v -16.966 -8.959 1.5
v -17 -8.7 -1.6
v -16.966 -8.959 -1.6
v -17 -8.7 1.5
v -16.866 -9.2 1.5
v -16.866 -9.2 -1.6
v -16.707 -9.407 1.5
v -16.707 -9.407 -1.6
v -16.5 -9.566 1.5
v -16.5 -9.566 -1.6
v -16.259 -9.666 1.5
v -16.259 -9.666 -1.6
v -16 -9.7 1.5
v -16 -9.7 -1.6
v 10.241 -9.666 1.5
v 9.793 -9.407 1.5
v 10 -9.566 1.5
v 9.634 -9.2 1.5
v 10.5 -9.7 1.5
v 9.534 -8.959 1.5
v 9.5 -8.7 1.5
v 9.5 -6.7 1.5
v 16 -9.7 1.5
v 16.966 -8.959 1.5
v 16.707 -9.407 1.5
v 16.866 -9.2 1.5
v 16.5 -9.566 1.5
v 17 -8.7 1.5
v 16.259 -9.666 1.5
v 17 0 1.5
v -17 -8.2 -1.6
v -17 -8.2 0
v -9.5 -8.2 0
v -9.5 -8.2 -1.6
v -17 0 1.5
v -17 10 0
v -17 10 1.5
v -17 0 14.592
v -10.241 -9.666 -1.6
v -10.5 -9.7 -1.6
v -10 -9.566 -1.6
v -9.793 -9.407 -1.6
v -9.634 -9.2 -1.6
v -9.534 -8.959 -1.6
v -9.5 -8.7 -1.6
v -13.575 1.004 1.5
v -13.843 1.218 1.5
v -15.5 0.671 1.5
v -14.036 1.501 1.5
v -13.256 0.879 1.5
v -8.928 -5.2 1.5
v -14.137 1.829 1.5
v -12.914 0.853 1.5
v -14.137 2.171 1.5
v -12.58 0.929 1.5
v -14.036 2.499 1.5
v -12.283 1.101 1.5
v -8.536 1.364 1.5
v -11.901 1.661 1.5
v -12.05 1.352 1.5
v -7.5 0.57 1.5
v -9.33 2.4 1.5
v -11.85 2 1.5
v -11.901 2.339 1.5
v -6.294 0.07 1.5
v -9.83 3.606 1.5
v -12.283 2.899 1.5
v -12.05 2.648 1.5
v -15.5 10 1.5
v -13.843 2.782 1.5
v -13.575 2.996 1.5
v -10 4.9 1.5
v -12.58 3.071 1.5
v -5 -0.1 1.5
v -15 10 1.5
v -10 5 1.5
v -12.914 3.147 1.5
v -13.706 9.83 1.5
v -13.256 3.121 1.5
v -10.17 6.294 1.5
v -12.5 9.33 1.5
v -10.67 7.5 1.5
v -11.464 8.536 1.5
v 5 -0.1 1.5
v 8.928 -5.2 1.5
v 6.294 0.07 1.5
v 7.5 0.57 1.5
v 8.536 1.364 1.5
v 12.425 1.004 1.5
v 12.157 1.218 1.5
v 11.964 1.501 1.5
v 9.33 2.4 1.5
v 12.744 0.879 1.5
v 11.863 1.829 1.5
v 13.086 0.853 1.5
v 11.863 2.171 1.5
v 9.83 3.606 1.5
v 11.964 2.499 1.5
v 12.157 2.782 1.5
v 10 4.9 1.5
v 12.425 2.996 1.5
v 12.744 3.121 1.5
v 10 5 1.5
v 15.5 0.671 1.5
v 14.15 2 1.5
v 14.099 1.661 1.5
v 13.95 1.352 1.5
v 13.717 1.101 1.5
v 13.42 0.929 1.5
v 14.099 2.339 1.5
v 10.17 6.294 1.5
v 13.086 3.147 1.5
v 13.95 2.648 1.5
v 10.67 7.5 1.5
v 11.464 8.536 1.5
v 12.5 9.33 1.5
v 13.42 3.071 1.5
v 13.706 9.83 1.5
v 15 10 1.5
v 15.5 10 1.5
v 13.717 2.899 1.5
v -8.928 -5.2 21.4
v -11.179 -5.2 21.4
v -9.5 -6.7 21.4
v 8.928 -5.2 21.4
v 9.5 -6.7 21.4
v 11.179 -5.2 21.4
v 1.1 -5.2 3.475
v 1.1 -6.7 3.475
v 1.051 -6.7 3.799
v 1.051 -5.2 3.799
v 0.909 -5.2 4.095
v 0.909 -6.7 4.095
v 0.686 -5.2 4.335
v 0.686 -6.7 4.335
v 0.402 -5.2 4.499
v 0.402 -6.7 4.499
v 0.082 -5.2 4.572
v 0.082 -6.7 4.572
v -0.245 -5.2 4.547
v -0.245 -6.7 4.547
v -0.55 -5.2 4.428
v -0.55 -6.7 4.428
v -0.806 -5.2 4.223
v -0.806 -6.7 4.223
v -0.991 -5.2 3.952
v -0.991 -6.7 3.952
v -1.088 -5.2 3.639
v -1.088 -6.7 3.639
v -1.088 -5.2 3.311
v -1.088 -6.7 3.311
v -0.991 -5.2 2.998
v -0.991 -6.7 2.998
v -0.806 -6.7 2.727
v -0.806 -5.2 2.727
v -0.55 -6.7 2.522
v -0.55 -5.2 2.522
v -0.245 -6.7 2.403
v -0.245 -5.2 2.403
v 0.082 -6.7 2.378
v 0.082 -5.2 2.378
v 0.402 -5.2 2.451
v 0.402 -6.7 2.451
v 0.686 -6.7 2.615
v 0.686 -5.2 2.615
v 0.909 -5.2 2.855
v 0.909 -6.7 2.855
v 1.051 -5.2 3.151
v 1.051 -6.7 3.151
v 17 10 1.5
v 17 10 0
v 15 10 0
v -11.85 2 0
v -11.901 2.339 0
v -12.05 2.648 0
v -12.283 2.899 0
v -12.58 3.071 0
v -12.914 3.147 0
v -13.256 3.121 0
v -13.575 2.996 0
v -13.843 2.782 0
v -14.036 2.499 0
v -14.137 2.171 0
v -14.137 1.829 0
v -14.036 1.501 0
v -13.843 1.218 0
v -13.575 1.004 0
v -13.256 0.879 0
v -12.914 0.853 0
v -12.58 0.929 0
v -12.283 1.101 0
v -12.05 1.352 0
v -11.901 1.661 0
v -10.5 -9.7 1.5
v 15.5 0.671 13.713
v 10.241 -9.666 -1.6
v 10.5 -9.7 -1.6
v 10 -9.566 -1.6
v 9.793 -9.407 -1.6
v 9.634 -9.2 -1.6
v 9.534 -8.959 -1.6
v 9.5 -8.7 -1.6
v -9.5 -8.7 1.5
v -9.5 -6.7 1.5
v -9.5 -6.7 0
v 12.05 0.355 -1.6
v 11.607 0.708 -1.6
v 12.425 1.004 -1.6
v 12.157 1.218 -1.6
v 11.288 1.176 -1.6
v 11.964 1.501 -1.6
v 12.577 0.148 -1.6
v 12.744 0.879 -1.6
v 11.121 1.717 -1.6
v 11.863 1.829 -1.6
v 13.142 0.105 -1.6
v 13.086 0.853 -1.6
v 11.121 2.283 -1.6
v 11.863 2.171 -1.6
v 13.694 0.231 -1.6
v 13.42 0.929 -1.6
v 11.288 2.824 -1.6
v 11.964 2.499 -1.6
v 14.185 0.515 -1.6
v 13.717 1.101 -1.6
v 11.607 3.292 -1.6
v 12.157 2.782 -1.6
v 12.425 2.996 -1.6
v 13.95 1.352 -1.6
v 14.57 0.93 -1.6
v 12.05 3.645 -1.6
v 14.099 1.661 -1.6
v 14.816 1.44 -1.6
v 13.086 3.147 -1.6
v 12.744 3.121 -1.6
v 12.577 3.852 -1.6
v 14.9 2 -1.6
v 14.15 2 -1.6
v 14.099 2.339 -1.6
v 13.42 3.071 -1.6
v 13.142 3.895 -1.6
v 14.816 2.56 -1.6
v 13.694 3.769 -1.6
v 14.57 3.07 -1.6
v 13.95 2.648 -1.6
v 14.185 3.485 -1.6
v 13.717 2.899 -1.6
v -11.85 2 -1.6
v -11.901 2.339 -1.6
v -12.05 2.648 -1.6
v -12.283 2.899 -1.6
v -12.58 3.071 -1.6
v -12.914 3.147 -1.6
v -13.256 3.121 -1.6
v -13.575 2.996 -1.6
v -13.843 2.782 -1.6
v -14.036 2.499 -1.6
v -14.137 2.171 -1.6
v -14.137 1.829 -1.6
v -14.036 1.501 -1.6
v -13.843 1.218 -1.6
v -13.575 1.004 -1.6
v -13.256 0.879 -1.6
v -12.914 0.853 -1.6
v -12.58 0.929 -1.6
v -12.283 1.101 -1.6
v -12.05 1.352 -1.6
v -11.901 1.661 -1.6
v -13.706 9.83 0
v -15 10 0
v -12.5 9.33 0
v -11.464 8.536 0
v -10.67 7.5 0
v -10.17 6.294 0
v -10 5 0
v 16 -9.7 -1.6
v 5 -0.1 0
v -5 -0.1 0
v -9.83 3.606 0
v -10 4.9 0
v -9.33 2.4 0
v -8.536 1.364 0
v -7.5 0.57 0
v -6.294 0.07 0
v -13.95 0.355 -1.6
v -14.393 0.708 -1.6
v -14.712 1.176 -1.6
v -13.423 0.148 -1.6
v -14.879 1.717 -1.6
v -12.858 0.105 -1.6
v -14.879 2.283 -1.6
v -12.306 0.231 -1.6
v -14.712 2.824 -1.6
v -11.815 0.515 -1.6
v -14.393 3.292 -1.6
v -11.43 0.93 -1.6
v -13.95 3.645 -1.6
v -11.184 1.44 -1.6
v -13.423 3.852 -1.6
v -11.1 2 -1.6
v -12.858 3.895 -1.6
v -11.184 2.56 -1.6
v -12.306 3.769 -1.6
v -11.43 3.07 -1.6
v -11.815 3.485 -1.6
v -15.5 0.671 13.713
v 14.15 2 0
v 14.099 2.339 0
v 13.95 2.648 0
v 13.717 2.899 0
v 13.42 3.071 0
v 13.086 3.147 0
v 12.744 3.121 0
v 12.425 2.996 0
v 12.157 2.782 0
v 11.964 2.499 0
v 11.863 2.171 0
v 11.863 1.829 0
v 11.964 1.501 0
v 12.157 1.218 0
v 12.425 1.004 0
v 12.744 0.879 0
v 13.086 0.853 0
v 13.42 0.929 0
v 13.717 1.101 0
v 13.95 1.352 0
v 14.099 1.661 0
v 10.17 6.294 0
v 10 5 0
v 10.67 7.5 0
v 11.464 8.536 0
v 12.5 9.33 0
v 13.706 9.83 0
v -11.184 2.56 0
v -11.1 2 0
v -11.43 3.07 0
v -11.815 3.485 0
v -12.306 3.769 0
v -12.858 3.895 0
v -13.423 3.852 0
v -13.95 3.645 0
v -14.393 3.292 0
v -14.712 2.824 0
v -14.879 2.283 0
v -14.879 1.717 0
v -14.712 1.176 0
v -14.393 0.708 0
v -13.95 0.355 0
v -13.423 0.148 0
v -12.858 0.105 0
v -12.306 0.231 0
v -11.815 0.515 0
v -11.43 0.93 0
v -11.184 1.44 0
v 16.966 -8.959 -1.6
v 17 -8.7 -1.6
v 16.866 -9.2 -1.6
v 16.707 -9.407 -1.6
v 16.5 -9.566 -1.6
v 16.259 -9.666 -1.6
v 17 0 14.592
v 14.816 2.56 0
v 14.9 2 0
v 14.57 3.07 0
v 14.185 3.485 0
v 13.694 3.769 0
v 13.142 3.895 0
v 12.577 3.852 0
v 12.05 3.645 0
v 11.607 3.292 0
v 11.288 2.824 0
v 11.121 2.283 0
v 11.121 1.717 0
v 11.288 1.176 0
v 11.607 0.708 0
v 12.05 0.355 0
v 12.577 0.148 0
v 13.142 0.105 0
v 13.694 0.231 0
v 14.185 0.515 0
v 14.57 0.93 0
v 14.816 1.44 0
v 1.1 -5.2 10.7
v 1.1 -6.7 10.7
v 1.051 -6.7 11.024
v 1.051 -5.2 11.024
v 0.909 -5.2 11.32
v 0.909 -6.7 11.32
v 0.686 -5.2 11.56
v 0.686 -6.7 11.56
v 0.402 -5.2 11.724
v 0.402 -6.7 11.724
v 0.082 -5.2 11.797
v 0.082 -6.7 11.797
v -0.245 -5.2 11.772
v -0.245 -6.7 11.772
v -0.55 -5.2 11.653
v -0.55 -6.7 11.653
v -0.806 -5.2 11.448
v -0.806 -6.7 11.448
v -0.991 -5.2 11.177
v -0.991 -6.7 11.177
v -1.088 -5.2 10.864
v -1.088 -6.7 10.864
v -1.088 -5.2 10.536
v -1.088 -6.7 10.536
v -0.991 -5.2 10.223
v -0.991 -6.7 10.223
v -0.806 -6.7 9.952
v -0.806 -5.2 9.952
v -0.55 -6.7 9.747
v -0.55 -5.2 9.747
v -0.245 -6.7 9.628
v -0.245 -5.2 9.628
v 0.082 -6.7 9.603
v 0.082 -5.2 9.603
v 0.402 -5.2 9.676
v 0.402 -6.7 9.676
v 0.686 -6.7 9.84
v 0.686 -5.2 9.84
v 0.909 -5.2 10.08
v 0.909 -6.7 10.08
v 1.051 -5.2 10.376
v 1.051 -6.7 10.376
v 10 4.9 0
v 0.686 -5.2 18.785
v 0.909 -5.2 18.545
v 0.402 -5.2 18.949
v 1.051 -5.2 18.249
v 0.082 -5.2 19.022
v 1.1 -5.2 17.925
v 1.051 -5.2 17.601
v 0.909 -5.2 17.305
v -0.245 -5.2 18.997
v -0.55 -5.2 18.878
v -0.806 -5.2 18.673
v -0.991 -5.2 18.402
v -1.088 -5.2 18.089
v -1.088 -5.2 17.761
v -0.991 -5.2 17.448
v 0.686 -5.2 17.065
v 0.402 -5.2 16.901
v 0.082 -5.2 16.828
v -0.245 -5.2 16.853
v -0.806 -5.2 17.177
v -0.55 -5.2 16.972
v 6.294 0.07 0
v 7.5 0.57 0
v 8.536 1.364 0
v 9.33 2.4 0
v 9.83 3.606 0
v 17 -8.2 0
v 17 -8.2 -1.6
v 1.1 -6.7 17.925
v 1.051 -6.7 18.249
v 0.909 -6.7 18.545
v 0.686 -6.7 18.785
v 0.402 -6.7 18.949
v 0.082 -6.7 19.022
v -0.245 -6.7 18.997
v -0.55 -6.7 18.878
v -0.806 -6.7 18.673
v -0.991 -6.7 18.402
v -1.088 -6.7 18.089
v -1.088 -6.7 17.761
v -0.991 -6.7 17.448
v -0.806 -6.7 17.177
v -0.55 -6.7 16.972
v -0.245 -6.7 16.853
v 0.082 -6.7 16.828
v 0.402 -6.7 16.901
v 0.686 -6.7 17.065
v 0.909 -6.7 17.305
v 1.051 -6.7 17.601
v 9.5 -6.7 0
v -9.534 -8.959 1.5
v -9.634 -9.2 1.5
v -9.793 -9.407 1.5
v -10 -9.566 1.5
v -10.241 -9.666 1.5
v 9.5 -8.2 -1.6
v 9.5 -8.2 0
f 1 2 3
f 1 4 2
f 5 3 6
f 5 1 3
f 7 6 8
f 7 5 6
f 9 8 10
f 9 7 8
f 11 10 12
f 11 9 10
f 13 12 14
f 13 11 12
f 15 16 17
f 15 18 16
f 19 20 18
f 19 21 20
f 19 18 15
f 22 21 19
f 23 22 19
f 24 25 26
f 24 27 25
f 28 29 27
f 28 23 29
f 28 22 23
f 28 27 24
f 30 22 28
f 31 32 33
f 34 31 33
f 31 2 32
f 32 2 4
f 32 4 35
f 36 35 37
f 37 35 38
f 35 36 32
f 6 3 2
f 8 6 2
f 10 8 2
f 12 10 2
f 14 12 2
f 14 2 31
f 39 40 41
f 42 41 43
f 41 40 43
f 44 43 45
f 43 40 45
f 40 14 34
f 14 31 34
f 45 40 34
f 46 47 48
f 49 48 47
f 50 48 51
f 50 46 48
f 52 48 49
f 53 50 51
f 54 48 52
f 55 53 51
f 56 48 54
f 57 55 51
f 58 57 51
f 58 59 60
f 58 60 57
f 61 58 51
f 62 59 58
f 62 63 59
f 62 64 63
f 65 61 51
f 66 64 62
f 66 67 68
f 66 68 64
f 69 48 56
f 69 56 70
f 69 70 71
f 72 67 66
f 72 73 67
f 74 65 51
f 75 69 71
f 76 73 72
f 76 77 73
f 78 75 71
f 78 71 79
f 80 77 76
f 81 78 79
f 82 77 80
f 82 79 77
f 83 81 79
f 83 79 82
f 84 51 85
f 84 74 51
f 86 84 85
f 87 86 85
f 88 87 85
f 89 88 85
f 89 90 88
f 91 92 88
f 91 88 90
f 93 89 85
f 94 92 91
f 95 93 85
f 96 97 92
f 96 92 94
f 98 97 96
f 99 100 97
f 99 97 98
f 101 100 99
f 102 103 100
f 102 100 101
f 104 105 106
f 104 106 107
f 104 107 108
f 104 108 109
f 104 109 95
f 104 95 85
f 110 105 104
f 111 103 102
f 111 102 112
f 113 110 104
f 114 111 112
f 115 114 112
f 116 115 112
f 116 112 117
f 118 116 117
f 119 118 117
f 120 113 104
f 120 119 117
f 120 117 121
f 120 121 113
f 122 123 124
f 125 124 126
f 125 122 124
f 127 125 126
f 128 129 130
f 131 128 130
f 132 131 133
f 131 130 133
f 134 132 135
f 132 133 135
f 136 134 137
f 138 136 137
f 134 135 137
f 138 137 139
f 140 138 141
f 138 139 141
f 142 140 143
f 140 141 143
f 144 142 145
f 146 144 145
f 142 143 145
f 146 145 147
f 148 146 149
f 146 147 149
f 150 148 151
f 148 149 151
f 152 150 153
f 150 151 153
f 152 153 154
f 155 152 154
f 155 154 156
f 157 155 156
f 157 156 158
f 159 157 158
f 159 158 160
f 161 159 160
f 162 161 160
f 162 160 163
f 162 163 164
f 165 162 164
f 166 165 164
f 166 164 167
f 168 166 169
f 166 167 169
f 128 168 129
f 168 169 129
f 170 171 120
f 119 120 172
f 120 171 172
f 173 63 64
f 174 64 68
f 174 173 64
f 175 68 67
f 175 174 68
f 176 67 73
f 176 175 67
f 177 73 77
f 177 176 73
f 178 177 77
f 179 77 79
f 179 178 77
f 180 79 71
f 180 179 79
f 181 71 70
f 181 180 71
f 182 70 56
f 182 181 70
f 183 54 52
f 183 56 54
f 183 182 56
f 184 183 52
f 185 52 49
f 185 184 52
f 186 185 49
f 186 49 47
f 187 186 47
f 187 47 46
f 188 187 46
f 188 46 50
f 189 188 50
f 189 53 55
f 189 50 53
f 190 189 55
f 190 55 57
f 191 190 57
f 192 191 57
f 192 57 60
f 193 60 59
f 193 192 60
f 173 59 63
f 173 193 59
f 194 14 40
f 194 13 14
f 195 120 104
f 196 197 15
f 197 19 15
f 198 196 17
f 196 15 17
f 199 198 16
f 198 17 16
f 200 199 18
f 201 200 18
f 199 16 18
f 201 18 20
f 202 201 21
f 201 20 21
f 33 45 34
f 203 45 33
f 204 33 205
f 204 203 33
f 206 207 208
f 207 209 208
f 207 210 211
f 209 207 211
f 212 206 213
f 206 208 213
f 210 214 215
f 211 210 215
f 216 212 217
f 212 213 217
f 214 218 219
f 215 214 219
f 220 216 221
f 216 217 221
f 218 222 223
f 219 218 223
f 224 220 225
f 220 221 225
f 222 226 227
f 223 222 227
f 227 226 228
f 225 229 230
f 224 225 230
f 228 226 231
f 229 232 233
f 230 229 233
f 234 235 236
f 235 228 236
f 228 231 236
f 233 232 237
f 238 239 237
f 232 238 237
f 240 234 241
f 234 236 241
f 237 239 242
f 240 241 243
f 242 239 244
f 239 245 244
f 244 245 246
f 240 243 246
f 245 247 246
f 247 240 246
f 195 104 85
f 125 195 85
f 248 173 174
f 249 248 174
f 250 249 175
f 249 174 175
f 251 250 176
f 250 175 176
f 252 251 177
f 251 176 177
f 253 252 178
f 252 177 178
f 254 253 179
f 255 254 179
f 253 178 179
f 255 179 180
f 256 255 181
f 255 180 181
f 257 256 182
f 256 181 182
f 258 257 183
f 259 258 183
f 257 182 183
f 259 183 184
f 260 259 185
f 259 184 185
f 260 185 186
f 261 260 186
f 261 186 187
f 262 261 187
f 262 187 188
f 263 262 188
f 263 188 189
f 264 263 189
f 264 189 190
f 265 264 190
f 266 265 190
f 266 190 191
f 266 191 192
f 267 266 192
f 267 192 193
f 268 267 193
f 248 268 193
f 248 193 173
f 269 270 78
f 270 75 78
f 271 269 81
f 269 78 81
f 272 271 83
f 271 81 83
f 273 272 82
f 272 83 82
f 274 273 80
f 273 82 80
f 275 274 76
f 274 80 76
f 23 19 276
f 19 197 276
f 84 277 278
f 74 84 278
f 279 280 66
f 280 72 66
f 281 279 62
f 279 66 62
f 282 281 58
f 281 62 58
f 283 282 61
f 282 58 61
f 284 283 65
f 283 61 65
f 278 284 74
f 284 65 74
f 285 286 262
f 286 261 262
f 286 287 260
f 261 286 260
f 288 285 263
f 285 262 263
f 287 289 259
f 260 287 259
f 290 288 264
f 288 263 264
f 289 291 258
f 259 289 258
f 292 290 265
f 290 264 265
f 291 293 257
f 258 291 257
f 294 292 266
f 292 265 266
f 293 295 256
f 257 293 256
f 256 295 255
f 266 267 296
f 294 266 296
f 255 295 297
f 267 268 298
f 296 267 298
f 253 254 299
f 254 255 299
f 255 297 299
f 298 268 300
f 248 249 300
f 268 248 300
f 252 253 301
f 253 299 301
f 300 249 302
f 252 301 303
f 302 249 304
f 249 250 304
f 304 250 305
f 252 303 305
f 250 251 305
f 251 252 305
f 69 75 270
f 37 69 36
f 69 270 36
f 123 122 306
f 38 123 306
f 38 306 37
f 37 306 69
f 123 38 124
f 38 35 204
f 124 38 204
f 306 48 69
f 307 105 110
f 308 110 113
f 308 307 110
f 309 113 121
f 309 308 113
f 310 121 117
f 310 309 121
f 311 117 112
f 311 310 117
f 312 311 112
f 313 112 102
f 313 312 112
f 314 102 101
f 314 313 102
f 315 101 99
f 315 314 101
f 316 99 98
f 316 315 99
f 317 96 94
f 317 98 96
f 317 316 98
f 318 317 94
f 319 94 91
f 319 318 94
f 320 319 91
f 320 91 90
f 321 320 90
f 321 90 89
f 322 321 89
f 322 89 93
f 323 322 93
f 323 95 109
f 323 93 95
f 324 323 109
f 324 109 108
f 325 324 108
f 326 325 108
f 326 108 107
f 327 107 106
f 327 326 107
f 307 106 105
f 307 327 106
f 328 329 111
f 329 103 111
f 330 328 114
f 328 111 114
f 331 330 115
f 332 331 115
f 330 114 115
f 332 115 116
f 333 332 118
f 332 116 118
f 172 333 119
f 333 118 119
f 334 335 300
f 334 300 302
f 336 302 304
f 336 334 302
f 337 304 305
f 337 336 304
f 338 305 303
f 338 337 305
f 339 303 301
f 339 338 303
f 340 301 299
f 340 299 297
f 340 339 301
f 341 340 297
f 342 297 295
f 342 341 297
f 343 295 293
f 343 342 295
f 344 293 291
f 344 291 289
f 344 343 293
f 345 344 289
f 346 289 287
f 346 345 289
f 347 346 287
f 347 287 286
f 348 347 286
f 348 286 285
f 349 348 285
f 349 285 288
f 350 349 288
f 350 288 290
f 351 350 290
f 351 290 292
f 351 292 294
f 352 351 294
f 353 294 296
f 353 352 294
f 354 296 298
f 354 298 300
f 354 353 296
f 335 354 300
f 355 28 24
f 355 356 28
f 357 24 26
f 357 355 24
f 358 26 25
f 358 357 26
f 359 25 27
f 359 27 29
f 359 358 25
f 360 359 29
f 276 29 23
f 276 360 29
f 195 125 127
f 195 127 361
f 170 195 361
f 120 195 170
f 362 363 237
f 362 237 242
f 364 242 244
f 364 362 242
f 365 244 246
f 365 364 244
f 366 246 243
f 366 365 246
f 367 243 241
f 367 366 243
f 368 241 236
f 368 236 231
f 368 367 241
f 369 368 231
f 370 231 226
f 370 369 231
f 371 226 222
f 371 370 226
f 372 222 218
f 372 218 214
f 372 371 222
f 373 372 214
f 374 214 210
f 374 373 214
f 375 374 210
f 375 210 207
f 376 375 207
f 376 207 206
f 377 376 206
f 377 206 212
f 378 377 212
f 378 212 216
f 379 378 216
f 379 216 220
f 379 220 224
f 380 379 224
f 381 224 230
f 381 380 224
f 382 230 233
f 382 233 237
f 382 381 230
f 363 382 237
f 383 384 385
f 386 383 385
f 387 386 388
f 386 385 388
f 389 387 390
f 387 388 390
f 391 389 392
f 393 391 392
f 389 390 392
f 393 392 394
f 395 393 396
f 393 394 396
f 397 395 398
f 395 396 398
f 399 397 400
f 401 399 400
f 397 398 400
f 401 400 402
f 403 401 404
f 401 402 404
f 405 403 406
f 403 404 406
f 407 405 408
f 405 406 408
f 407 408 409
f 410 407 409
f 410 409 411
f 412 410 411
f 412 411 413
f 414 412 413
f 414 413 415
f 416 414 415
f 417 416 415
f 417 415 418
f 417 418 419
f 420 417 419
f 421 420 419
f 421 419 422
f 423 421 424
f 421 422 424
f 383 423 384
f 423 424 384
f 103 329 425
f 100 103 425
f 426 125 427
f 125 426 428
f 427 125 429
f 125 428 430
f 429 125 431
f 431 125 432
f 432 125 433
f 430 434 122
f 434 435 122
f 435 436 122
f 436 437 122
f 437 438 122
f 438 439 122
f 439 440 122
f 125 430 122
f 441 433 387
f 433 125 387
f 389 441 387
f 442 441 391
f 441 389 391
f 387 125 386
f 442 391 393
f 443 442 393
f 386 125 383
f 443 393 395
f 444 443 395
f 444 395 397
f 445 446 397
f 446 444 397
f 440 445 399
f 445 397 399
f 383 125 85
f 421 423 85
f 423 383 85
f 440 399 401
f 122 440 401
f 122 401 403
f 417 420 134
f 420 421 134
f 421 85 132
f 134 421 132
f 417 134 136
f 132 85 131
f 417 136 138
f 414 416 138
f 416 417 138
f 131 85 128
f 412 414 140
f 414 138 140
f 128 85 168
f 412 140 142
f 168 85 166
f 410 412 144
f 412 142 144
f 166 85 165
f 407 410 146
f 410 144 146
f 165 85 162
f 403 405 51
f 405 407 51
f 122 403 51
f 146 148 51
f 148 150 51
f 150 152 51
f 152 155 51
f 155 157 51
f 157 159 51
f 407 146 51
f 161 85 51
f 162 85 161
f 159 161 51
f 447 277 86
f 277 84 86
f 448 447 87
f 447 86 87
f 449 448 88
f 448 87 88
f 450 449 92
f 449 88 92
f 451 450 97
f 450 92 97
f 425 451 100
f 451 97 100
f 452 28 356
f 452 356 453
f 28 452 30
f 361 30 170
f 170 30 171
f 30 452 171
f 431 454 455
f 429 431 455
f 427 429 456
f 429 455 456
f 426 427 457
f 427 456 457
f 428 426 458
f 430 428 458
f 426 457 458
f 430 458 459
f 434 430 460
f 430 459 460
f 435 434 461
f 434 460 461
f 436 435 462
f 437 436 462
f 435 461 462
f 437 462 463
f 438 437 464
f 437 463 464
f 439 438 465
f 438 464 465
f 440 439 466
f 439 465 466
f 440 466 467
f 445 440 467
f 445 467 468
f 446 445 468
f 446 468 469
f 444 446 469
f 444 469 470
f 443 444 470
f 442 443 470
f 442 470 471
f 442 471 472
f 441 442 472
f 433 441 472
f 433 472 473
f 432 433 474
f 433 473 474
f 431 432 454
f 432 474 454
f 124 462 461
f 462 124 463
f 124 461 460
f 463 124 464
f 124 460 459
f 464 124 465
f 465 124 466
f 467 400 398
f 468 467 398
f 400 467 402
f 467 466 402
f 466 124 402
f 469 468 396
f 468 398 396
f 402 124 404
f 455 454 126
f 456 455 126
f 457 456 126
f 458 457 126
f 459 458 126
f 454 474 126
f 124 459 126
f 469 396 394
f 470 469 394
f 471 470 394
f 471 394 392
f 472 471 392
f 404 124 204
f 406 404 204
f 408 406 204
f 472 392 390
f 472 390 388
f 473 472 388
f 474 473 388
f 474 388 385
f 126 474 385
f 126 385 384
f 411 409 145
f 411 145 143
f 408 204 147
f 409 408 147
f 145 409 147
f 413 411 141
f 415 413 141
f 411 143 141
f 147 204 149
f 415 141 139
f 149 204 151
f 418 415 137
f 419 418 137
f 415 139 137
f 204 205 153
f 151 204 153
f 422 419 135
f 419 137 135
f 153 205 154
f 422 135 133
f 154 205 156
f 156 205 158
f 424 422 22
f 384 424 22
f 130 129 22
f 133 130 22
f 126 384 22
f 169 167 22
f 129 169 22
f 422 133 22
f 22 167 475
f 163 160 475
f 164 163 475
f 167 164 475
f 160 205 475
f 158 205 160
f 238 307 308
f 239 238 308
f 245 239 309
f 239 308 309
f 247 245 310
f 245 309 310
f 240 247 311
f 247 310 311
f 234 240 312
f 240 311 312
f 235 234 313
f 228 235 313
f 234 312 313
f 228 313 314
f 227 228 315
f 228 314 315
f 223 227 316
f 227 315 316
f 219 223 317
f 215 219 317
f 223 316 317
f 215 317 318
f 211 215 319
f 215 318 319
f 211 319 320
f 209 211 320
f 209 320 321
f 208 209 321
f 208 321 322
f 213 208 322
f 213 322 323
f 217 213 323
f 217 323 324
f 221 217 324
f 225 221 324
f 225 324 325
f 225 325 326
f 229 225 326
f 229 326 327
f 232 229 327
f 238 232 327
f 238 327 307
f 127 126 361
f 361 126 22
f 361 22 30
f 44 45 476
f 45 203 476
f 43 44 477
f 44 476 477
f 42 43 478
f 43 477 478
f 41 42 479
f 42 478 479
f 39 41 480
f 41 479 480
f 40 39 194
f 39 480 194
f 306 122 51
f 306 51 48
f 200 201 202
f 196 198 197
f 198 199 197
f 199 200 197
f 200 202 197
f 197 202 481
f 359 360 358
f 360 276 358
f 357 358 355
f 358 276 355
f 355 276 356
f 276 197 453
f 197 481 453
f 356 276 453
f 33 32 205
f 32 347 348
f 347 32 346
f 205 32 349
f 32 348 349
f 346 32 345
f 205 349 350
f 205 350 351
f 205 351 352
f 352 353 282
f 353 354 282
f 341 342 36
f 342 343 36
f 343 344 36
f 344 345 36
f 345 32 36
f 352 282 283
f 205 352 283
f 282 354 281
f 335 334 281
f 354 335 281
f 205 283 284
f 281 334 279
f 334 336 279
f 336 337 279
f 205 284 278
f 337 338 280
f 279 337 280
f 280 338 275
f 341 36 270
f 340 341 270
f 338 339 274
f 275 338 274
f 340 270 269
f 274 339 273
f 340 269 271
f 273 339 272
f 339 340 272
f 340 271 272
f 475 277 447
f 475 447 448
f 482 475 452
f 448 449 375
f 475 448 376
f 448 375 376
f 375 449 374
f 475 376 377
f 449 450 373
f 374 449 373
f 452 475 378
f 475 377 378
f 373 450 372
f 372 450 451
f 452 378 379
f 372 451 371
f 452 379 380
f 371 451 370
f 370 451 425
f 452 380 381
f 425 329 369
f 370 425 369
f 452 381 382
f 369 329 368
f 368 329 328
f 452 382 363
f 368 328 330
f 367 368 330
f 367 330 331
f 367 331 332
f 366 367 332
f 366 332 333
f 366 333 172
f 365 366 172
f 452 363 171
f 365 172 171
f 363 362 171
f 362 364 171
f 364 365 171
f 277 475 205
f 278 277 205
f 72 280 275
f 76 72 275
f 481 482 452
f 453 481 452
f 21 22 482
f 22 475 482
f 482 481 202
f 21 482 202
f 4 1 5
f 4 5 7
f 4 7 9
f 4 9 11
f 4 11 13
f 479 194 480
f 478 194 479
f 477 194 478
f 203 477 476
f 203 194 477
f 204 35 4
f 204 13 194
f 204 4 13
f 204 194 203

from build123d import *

# Parameters (mm, degrees)
F4_DEPTH       = 21.4
F5_DEPTH       = 1.5
F1_R           = 1.9
F6_DEPTH       = 1.6
F8_DEPTH       = 17.001
F8_DEPTH_BACK  = 17.001
F9_R           = 1.15
F10_DEPTH      = 21.401
F10_DEPTH_BACK = 1.601
F11_R          = 1.1
F12_DEPTH      = 1.5
F15_DEPTH      = 1.5
F14_W          = 7.5
F14_H          = 1.5
F16_DEPTH      = 1.6
F17_R          = 1
F18_R          = 5


with BuildPart() as f4:
    # F3 (on face) → F4 (new body)
    with BuildSketch(Plane.XY):
        Polygon((-15.5, 10), (-17, 10), (-17, 0), (-9.5, -6.7), (0, -6.7), (9.5, -6.7), (17, 0), (17, 10), (15.5, 10), (15.5, 0.6713676939), (8.927573477, -5.2), (0, -5.2), (-8.927573477, -5.2), (-15.5, 0.6713676939), align=None)
    extrude(amount=F4_DEPTH)

    # F2 (on Top) → F5 (join)
    with BuildSketch(Plane.XY):
        Polygon((-17, 0), (-9.5, -6.7), (0, -6.7), (9.5, -6.7), (17, 0), (17, 10), (10, 10), (10, -0.1), (0, -0.1), (-10, -0.1), (-10, 10), (-17, 10), align=None)
    extrude(amount=F5_DEPTH)

    # F1 (on Top) → F6 (join)
    with BuildSketch(Plane.XY):
        with Locations((-13, 2)):
            Circle(F1_R)
        with Locations((13, 2)):
            Circle(F1_R)
    extrude(amount=-F6_DEPTH)

    # F7 (on Right) → F8 (cut, two sides)
    with BuildSketch(Plane.YZ) as f8_sk:
        Polygon((-5.2, 21.4), (10, 1.5), (10, 21.4), align=None)
    extrude(amount=-F8_DEPTH, mode=Mode.SUBTRACT)
    extrude(f8_sk.sketch, amount=F8_DEPTH_BACK, mode=Mode.SUBTRACT)

    # F9 (on Top) → F10 (cut, two sides)
    with BuildSketch(Plane.XY) as f10_sk:
        with Locations((13, 2)):
            Circle(F9_R)
        with Locations((-13, 2)):
            Circle(F9_R)
    extrude(amount=F10_DEPTH, mode=Mode.SUBTRACT)
    extrude(f10_sk.sketch, amount=-F10_DEPTH_BACK, mode=Mode.SUBTRACT)

    # F11 (on face) → F12 (cut, through all)
    with BuildSketch(Plane.XZ.offset(6.7)):
        with Locations((0, 3.475)):
            Circle(F11_R)
        with Locations((0, 17.925)):
            Circle(F11_R)
        with Locations((0, 10.7)):
            Circle(F11_R)
    extrude(amount=-F12_DEPTH, mode=Mode.SUBTRACT)

    # F13 (on Top) → F15 (join)
    with BuildSketch(Plane.XY):
        Polygon((-17, 0), (-17, -9.7), (-9.5, -9.7), (-9.5, -6.7), align=None)
        Polygon((9.5, -9.7), (17, -9.7), (17, 0), (9.5, -6.7), align=None)
    extrude(amount=F15_DEPTH)

    # F14 (on face) → F16 (join)
    with BuildSketch(Plane.XY):
        with Locations((-13.25, -8.95)):
            Rectangle(F14_W, F14_H)
        with Locations((13.25, -8.95)):
            Rectangle(F14_W, F14_H)
    extrude(amount=-F16_DEPTH)

    # F17
    f17_edges = [f4.edges().sort_by_distance(p)[0] for p in [
        (17, -9.7, -0.05),
        (-17, -9.7, -0.05),
        (-9.5, -9.7, -0.05),
        (9.5, -9.7, -0.05),
    ]]
    fillet(f17_edges, radius=F17_R)

    # F18
    f18_edges = [f4.edges().sort_by_distance(p)[0] for p in [
        (10, -0.1, 0.75),
        (10, 10, 0.75),
        (-10, -0.1, 0.75),
        (-10, 10, 0.75),
    ]]
    fillet(f18_edges, radius=F18_R)


solid = f4.part
